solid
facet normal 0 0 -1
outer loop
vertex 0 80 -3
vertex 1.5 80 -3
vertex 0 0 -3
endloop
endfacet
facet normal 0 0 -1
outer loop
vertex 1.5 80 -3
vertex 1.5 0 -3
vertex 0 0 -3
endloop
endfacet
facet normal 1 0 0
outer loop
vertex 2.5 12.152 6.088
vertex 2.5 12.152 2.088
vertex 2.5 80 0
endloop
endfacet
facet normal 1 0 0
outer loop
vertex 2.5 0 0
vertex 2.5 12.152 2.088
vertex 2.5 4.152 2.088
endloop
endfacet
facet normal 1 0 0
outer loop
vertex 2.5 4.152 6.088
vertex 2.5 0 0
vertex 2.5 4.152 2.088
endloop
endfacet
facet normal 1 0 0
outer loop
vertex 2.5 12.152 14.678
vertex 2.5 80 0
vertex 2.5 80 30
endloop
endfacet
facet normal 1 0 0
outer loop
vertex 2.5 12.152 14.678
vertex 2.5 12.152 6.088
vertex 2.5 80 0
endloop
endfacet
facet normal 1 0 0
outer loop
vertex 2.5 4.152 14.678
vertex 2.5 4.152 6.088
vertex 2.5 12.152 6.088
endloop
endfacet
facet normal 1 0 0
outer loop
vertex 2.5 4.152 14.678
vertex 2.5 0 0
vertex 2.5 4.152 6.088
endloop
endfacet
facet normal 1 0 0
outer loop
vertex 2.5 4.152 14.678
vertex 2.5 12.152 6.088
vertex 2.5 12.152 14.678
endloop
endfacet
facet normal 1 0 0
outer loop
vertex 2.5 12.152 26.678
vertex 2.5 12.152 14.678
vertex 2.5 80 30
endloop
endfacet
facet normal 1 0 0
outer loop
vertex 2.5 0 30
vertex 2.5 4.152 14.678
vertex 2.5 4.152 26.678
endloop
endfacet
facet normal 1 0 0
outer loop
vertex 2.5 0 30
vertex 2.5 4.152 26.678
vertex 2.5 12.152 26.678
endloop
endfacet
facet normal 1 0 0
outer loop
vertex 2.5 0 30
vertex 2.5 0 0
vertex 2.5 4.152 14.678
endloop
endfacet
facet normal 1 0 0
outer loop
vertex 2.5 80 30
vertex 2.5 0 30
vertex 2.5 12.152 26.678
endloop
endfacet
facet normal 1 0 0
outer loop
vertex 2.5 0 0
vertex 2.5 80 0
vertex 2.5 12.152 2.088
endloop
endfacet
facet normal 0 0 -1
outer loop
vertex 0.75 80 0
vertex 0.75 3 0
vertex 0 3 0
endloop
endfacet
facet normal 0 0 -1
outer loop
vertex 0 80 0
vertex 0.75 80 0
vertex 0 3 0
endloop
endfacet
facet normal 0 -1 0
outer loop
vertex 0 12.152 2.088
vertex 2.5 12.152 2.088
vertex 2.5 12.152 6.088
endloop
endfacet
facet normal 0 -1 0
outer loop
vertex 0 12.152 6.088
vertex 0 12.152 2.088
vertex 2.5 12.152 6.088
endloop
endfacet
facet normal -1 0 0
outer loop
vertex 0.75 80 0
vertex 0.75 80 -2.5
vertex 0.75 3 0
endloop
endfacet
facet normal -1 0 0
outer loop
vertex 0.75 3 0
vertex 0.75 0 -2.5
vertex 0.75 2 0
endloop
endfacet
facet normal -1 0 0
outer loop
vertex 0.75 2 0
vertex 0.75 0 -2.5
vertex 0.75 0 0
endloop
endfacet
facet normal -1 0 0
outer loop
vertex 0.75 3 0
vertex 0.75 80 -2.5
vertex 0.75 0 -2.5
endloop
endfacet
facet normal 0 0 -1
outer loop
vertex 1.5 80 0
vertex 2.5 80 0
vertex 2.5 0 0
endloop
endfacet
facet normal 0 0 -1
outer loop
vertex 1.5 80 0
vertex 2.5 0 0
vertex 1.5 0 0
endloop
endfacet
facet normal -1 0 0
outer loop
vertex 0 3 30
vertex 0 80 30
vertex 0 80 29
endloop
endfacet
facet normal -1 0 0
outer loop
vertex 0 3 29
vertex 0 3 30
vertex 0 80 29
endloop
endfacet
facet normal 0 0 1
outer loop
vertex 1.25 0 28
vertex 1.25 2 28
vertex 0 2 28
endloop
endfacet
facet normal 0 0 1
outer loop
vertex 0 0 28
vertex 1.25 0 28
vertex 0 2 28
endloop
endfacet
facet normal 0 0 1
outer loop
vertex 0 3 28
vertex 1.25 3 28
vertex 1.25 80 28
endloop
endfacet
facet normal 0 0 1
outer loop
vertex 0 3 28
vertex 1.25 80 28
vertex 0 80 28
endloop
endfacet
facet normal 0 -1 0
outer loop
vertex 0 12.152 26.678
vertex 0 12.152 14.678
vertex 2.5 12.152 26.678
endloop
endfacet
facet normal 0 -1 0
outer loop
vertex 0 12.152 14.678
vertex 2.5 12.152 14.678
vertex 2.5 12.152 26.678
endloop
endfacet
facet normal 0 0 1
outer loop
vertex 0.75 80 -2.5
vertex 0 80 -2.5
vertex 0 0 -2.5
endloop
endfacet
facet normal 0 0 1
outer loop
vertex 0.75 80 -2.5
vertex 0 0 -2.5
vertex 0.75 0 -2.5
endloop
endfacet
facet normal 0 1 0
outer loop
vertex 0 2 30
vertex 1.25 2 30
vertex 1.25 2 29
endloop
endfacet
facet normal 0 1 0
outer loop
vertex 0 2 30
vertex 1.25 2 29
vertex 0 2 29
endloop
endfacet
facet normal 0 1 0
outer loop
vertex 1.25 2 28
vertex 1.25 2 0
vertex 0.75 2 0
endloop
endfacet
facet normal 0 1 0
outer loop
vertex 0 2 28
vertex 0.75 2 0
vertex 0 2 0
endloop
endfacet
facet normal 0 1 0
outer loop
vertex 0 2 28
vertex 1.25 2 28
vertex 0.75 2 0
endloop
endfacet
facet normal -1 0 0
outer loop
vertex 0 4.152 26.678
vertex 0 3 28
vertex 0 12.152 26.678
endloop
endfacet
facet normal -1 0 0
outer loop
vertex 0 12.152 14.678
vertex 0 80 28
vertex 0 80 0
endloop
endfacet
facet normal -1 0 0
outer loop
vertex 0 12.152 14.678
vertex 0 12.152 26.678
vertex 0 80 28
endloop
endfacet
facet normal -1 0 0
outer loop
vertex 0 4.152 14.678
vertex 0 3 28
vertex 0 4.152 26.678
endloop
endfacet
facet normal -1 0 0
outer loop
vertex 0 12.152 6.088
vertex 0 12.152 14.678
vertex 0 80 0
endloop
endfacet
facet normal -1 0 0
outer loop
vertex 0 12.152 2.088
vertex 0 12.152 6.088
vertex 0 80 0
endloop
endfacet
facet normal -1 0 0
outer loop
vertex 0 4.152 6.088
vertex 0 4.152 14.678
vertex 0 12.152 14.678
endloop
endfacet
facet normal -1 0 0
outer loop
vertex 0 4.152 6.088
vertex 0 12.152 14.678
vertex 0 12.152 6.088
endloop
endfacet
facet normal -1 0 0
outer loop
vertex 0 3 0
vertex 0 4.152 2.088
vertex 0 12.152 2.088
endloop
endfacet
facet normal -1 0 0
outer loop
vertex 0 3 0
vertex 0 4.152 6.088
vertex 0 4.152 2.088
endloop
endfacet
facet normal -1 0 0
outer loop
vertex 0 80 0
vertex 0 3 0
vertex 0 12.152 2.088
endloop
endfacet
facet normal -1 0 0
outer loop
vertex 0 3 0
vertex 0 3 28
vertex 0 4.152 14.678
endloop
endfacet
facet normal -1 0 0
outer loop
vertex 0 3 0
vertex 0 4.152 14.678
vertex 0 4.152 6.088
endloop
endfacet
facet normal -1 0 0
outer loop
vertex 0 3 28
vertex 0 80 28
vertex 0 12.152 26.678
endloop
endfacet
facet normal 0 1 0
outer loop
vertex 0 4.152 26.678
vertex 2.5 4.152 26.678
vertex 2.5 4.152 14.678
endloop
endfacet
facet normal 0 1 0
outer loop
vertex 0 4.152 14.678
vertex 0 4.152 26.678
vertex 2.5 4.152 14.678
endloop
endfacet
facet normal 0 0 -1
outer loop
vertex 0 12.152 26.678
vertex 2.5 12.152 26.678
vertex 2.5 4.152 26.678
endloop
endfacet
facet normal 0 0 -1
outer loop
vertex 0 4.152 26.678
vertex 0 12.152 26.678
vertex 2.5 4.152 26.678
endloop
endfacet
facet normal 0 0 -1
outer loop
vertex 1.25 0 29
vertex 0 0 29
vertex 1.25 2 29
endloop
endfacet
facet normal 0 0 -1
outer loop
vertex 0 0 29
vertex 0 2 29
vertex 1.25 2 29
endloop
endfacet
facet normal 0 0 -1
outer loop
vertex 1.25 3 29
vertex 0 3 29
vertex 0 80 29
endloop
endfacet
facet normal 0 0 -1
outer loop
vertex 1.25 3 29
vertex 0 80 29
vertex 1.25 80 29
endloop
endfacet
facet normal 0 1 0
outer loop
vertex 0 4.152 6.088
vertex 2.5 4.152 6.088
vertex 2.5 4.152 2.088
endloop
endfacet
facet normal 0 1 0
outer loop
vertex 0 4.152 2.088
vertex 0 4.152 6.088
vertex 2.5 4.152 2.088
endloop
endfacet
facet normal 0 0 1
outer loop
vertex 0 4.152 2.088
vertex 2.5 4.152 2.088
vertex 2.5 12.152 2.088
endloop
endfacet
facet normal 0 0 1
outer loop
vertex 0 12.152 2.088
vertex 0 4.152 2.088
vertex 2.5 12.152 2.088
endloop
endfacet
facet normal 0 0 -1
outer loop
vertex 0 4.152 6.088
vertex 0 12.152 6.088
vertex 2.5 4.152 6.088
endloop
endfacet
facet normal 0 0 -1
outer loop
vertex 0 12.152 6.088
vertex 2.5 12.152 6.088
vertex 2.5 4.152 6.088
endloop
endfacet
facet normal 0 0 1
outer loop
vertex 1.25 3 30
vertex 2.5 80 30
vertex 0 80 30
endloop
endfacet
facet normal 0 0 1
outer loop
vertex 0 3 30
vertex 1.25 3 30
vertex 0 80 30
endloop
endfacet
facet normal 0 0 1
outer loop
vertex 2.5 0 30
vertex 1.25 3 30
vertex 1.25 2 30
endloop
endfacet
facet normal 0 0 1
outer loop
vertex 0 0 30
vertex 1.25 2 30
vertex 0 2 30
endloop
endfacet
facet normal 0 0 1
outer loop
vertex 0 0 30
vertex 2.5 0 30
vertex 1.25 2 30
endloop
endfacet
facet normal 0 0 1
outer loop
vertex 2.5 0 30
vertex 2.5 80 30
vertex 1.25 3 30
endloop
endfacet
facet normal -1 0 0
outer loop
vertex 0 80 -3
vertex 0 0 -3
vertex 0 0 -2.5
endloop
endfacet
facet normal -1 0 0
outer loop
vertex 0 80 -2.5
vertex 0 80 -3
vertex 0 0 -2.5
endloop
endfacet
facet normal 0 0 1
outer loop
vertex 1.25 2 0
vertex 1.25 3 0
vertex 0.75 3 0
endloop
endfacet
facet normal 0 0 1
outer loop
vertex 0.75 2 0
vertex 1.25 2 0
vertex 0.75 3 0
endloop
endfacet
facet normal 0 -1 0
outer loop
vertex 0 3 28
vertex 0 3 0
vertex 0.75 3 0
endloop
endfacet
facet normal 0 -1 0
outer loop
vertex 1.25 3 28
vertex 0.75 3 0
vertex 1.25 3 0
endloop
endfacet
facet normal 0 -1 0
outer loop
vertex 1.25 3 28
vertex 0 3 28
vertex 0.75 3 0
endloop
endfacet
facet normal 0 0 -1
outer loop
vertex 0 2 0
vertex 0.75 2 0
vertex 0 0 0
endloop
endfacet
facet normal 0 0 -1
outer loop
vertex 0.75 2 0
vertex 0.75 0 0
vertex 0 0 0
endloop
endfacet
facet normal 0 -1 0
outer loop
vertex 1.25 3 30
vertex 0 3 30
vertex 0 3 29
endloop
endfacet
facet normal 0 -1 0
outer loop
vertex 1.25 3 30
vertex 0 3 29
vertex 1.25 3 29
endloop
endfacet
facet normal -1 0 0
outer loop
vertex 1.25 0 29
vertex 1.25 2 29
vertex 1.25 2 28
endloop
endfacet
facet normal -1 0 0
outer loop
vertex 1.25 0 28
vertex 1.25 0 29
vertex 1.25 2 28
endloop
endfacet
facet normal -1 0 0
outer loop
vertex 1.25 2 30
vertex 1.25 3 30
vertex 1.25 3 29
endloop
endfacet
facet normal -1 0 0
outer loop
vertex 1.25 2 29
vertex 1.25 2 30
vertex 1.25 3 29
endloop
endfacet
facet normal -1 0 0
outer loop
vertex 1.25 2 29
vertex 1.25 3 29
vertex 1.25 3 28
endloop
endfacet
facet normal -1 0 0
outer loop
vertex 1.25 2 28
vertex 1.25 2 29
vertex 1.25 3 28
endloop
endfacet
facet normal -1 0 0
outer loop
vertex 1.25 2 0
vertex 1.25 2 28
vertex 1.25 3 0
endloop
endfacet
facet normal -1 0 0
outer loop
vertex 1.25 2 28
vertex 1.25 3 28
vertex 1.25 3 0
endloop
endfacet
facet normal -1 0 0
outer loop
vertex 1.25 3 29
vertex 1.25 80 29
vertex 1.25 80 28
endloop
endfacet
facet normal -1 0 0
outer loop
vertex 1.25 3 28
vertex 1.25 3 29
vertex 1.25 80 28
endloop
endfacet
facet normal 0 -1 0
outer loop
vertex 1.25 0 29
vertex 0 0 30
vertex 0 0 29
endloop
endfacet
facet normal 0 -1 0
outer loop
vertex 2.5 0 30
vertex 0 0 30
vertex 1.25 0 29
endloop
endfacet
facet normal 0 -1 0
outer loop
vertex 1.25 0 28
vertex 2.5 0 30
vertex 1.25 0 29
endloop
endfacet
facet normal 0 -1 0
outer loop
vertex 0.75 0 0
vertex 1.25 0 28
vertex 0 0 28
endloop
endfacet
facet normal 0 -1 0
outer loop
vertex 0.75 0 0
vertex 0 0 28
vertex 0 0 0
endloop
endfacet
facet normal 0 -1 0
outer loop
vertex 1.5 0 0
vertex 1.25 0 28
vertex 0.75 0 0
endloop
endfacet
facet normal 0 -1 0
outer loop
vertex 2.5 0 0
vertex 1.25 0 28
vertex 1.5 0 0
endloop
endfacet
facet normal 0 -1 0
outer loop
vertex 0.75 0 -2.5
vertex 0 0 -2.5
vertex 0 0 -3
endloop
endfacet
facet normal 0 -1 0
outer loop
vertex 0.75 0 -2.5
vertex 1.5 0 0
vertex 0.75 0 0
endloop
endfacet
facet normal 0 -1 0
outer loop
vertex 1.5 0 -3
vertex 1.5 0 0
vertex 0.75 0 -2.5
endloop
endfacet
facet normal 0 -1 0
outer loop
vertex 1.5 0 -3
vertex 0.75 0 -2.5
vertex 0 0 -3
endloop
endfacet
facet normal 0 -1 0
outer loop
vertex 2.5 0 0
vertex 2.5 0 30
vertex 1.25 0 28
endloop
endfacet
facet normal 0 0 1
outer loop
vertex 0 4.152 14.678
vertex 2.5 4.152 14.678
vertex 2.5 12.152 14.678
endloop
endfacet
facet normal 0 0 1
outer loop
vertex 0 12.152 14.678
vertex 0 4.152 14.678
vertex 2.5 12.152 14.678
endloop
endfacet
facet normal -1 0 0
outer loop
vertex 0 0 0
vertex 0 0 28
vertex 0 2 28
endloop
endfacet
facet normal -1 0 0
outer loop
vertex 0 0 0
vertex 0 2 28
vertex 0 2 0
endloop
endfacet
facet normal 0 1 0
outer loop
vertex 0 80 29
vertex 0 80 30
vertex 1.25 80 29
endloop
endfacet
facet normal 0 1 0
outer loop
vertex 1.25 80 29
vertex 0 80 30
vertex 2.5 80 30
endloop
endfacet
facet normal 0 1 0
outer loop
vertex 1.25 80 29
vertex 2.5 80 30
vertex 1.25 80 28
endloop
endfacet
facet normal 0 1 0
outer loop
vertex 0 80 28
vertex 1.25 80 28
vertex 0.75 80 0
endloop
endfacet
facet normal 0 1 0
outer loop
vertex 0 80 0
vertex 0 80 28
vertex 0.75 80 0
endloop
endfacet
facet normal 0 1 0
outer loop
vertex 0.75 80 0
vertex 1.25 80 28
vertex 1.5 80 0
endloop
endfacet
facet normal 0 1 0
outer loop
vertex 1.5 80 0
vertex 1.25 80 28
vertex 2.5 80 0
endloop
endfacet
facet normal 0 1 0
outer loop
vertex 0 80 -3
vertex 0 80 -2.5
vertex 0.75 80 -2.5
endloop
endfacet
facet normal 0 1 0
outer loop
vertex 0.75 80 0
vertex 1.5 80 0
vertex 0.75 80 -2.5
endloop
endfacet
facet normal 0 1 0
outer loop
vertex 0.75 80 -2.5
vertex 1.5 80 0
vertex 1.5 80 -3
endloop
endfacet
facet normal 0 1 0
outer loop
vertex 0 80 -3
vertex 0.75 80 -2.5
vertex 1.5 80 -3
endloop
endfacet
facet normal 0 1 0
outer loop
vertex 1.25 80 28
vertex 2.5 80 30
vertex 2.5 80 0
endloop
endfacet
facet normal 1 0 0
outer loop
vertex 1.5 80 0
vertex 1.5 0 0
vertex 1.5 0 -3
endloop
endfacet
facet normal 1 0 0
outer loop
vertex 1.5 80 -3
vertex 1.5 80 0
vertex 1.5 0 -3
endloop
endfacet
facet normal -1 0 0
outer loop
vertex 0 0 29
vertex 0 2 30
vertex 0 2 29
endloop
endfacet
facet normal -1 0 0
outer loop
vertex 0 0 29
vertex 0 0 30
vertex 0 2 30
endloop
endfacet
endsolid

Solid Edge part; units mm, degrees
sketch "Sketch1" plane through (0, 0, 0) normal (0, -1, 0) x (1, 0, 0)
  line L0 (0, 30) -> (0, 0)
  line L1 (0.75, 0) -> (0, 0)
  line L2 (0.75, -2.5) -> (0.75, 0)
  line L3 (0, -2.5) -> (0.75, -2.5)
  line L4 (0, -3) -> (0, -2.5)
  line L5 (1.5, -3) -> (0, -3)
  line L6 (1.5, 0) -> (1.5, -3)
  line L7 (2.5, 0) -> (1.5, 0)
  line L8 (2.5, 0) -> (2.5, 30)
  line L9 (2.5, 30) -> (0, 30)
extrude "Protrusion1" add sketch "Sketch1" against normal blind 80
sketch "Sketch2" plane through (1.25, 80, 13.5) normal (0, 1, 0) x (0, 0, 1)
  line L0 (15.5, -1.25) -> (15.5, 0)
  line L1 (15.5, 0) -> (14.5, 0)
  line L2 (14.5, 0) -> (14.5, -1.25)
extrude "Vyříznutí_1" cut sketch "Sketch2" against normal blind 110.5 material side at (0.625, 80, 28.95)
extrude "Protrusion2" [suppressed]
extrude "Cutout1" [suppressed]
extrude "Cutout2" [suppressed]
extrude "Cutout3" [suppressed]
extrude "Cutout4" [suppressed]
sketch "Sketch3" plane through (1.25, 40, 30) normal (0, 0, 1) x (0, 1, 0)
  line L0 (-38, 1.25) -> (-37, 1.25)
  line L1 (-37, 1.25) -> (-37, 0)
  line L2 (-37, 0) -> (-38, 0)
  line L3 (-38, 0) -> (-38, 1.25)
extrude "Cutout5" cut sketch "Sketch3" against normal blind 30
sketch "Sketch4" plane through (2.5, 40, 15) normal (1, 0, 0) x (0, 1, 0)
  line L0 (-27.8483, -0.3216) -> (-27.8483, 11.6784)
  line L1 (-27.8483, 11.6784) -> (-35.8483, 11.6784)
  line L2 (-35.8483, 11.6784) -> (-35.8483, -0.3216)
  line L3 (-35.8483, -0.3216) -> (-27.8483, -0.3216)
  line L4 (-27.8483, -12.9122) -> (-27.8483, -8.9122)
  line L5 (-27.8483, -8.9122) -> (-35.8483, -8.9122)
  line L6 (-35.8483, -8.9122) -> (-35.8483, -12.9122)
  line L7 (-35.8483, -12.9122) -> (-27.8483, -12.9122)
extrude "Vyříznutí_8" cut sketch "Sketch4" against normal blind 2.5
